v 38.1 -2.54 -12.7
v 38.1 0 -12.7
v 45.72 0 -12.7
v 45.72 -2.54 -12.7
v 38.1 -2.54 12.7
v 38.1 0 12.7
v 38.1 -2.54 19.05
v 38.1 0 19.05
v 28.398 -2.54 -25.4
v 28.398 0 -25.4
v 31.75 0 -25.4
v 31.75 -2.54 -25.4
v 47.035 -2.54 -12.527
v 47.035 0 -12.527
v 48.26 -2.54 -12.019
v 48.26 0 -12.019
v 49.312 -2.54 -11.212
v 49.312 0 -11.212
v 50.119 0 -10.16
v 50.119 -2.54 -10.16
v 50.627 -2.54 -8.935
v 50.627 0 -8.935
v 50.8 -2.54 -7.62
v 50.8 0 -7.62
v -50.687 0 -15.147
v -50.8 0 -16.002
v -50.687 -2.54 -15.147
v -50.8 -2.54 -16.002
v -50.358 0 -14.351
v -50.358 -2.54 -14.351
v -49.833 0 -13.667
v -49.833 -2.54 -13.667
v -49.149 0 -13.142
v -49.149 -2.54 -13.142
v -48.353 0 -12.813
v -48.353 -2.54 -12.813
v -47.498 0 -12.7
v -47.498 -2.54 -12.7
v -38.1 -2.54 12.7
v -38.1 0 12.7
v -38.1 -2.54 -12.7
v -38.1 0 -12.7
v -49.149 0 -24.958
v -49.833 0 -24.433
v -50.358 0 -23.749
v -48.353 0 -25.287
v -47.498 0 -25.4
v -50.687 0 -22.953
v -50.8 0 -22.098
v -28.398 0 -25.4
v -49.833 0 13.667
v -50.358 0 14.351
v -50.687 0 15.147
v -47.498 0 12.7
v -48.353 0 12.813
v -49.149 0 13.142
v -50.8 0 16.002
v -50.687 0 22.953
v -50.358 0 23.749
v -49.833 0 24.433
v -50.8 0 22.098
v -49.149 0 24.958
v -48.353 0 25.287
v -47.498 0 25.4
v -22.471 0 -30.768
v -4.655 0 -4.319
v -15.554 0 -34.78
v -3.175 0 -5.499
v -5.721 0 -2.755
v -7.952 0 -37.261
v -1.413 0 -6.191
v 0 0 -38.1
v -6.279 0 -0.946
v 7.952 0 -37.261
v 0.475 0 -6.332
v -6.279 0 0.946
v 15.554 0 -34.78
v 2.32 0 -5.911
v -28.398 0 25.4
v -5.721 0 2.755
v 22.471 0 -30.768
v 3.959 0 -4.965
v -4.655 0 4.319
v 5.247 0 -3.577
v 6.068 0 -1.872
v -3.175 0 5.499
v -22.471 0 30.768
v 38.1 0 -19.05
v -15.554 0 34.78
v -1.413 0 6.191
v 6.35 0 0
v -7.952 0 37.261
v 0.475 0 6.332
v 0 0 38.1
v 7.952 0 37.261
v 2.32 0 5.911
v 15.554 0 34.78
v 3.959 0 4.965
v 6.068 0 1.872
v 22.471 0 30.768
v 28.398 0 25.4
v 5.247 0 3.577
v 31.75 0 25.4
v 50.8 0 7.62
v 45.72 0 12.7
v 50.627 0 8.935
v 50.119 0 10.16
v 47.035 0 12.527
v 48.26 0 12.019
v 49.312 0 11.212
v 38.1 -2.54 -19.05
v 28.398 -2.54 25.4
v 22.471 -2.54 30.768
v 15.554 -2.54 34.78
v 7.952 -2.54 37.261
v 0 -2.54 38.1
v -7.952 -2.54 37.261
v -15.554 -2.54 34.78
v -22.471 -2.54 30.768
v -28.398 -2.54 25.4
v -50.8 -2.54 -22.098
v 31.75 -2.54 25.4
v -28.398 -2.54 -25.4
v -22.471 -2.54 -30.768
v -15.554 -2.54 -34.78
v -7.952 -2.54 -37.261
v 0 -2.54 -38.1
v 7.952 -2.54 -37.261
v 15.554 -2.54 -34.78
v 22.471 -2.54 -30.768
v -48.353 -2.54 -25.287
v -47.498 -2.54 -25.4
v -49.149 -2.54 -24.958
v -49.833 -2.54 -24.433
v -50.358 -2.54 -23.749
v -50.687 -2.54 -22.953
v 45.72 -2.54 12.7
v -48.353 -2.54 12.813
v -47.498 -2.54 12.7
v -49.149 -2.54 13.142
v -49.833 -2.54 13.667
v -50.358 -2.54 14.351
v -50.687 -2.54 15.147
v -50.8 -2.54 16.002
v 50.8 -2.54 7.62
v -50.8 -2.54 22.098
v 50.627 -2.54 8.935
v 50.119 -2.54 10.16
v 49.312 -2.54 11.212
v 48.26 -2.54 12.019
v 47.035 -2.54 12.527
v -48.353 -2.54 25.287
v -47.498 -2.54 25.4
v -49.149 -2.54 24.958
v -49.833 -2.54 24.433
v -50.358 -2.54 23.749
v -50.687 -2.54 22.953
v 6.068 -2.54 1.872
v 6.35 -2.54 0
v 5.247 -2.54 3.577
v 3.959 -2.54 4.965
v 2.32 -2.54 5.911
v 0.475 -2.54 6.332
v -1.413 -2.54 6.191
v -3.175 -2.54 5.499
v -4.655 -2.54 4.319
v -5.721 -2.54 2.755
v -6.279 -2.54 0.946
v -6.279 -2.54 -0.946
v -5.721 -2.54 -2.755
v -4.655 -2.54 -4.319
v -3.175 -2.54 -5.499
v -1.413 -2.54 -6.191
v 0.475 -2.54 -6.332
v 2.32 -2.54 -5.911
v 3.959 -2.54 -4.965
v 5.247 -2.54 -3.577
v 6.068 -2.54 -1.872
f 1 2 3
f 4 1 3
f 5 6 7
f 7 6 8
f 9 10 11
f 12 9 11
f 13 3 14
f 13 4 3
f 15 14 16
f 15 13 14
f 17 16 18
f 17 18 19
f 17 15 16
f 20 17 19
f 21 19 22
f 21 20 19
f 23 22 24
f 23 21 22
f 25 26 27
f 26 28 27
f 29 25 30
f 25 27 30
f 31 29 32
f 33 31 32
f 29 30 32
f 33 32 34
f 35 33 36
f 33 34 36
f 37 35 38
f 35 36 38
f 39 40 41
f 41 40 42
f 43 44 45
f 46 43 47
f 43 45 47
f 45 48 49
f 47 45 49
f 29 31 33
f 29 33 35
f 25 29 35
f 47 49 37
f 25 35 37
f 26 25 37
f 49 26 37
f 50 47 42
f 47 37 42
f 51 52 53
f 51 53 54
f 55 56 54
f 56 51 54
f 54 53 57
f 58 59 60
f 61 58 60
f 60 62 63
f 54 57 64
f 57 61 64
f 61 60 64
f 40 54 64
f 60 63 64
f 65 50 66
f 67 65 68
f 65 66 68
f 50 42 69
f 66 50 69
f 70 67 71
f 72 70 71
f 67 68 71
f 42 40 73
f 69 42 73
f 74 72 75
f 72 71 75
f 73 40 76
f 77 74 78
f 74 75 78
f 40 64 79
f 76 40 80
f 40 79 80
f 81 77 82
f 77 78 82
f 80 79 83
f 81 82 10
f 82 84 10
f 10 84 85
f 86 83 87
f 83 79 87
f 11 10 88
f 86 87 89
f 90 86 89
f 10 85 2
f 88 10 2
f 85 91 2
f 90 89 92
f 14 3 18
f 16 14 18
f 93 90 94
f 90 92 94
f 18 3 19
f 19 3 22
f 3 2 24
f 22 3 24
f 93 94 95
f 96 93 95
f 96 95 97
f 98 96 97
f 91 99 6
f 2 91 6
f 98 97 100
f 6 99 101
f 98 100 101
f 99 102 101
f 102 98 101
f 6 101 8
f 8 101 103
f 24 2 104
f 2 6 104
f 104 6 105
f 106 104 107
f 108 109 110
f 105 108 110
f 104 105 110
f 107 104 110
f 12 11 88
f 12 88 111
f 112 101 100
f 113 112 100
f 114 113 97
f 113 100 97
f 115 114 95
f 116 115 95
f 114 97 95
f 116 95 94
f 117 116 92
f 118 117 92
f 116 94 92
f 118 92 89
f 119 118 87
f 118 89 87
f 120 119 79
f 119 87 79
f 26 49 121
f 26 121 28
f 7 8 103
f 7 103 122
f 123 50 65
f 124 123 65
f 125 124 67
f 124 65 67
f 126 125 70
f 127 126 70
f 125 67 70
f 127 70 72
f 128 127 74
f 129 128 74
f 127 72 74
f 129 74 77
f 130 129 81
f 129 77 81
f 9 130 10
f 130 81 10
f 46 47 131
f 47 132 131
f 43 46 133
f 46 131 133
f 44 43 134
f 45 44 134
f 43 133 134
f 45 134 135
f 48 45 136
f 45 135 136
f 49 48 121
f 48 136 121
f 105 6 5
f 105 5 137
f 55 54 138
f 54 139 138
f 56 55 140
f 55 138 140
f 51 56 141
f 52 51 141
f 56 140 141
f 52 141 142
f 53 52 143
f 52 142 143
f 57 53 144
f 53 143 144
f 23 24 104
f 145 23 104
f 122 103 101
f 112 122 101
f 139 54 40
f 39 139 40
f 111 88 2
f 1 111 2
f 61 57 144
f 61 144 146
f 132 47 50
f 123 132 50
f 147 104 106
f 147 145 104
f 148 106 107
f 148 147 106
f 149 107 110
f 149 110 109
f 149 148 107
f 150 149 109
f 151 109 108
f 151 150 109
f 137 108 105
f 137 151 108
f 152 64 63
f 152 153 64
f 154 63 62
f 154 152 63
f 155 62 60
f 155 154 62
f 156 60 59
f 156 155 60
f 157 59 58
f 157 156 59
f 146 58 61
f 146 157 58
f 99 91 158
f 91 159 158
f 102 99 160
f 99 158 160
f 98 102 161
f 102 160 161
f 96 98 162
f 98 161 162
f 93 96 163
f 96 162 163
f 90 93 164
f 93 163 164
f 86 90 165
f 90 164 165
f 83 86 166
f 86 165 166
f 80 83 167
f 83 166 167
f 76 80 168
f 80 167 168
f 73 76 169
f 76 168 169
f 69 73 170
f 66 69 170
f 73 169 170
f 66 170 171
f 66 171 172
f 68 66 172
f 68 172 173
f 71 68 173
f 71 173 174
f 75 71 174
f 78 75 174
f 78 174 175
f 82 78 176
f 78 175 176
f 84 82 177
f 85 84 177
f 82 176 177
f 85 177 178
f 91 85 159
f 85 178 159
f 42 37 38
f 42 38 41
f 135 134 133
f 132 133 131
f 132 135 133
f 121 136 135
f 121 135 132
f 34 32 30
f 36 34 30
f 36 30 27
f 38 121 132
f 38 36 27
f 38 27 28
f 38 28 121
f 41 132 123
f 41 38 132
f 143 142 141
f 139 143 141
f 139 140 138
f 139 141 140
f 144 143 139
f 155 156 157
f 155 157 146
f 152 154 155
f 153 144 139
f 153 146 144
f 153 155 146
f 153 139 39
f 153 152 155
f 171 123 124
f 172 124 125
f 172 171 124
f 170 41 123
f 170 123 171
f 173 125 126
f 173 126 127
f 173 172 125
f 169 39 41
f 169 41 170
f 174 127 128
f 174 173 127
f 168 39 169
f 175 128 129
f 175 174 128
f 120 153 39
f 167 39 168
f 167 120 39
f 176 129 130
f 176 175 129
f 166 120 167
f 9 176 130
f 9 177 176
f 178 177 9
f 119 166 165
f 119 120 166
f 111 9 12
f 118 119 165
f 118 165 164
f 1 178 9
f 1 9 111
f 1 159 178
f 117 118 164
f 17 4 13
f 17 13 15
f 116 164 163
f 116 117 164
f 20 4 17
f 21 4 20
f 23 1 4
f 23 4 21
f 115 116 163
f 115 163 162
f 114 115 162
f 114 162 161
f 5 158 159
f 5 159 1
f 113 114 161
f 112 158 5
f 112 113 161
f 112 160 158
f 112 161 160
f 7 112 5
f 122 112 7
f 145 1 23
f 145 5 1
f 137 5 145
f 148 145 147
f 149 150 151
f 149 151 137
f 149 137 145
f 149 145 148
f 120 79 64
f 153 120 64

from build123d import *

# Parameters (mm, degrees)
F0_W     = 12.7
F0_H     = 25.4
F0_H_2   = 12.7
F1_DEPTH = 2.54
F3_R     = 6.35
F4_DEPTH = 12.7
F5_SIZE  = 6.35
F6_SIZE  = 6.35
F7_R     = 5.08
F8_R     = 3.302


with BuildPart() as f1:
    # F0 (on Front) → F1 (new body)
    with BuildSketch(Plane.XZ):
        with BuildLine():
            Line((38.1, 12.7), (38.1, 25.4))
            Line((38.1, 25.4), (28.398063, 25.4))
            ThreePointArc((28.398063, 25.4), (0, 38.1), (-28.398063, 25.4))
            Line((-28.398063, 25.4), (-38.1, 25.4))
            Line((-38.1, 25.4), (-38.1, 12.7))
            Line((-38.1, 12.7), (-38.1, -12.7))
            Line((-38.1, -12.7), (-38.1, -25.4))
            Line((-38.1, -25.4), (-28.398063, -25.4))
            ThreePointArc((-28.398063, -25.4), (0, -38.1), (28.398063, -25.4))
            Line((28.398063, -25.4), (38.1, -25.4))
            Line((38.1, -25.4), (38.1, -12.7))
            Line((38.1, -12.7), (38.1, 12.7))
        make_face()
        with Locations((44.45, 0)):
            Rectangle(F0_W, F0_H)
        with Locations((-44.45, 19.05)):
            Rectangle(F0_W, F0_H_2)
        with Locations((-44.45, -19.05)):
            Rectangle(F0_W, F0_H_2)
    extrude(amount=F1_DEPTH)

    # F3 (on face) → F4 (cut, symmetric)
    with BuildSketch(Plane.XZ.offset(2.54)):
        Circle(F3_R)
    extrude(amount=F4_DEPTH, both=True, mode=Mode.SUBTRACT)

    # F5
    f5_edges = [f1.edges().sort_by_distance(p)[0] for p in [
        (38.1, -1.27, 25.4),
    ]]
    chamfer(f5_edges, length=F5_SIZE)

    # F6
    f6_edges = [f1.edges().sort_by_distance(p)[0] for p in [
        (38.1, -1.27, -25.4),
    ]]
    chamfer(f6_edges, length=F6_SIZE)

    # F7
    f7_edges = [f1.edges().sort_by_distance(p)[0] for p in [
        (50.8, -1.27, 12.7),
        (50.8, -1.27, -12.7),
    ]]
    fillet(f7_edges, radius=F7_R)

    # F8
    f8_edges = [f1.edges().sort_by_distance(p)[0] for p in [
        (-50.8, -1.27, 25.4),
        (-50.8, -1.27, 12.7),
        (-50.8, -1.27, -25.4),
        (-50.8, -1.27, -12.7),
    ]]
    fillet(f8_edges, radius=F8_R)


solid = f1.part
